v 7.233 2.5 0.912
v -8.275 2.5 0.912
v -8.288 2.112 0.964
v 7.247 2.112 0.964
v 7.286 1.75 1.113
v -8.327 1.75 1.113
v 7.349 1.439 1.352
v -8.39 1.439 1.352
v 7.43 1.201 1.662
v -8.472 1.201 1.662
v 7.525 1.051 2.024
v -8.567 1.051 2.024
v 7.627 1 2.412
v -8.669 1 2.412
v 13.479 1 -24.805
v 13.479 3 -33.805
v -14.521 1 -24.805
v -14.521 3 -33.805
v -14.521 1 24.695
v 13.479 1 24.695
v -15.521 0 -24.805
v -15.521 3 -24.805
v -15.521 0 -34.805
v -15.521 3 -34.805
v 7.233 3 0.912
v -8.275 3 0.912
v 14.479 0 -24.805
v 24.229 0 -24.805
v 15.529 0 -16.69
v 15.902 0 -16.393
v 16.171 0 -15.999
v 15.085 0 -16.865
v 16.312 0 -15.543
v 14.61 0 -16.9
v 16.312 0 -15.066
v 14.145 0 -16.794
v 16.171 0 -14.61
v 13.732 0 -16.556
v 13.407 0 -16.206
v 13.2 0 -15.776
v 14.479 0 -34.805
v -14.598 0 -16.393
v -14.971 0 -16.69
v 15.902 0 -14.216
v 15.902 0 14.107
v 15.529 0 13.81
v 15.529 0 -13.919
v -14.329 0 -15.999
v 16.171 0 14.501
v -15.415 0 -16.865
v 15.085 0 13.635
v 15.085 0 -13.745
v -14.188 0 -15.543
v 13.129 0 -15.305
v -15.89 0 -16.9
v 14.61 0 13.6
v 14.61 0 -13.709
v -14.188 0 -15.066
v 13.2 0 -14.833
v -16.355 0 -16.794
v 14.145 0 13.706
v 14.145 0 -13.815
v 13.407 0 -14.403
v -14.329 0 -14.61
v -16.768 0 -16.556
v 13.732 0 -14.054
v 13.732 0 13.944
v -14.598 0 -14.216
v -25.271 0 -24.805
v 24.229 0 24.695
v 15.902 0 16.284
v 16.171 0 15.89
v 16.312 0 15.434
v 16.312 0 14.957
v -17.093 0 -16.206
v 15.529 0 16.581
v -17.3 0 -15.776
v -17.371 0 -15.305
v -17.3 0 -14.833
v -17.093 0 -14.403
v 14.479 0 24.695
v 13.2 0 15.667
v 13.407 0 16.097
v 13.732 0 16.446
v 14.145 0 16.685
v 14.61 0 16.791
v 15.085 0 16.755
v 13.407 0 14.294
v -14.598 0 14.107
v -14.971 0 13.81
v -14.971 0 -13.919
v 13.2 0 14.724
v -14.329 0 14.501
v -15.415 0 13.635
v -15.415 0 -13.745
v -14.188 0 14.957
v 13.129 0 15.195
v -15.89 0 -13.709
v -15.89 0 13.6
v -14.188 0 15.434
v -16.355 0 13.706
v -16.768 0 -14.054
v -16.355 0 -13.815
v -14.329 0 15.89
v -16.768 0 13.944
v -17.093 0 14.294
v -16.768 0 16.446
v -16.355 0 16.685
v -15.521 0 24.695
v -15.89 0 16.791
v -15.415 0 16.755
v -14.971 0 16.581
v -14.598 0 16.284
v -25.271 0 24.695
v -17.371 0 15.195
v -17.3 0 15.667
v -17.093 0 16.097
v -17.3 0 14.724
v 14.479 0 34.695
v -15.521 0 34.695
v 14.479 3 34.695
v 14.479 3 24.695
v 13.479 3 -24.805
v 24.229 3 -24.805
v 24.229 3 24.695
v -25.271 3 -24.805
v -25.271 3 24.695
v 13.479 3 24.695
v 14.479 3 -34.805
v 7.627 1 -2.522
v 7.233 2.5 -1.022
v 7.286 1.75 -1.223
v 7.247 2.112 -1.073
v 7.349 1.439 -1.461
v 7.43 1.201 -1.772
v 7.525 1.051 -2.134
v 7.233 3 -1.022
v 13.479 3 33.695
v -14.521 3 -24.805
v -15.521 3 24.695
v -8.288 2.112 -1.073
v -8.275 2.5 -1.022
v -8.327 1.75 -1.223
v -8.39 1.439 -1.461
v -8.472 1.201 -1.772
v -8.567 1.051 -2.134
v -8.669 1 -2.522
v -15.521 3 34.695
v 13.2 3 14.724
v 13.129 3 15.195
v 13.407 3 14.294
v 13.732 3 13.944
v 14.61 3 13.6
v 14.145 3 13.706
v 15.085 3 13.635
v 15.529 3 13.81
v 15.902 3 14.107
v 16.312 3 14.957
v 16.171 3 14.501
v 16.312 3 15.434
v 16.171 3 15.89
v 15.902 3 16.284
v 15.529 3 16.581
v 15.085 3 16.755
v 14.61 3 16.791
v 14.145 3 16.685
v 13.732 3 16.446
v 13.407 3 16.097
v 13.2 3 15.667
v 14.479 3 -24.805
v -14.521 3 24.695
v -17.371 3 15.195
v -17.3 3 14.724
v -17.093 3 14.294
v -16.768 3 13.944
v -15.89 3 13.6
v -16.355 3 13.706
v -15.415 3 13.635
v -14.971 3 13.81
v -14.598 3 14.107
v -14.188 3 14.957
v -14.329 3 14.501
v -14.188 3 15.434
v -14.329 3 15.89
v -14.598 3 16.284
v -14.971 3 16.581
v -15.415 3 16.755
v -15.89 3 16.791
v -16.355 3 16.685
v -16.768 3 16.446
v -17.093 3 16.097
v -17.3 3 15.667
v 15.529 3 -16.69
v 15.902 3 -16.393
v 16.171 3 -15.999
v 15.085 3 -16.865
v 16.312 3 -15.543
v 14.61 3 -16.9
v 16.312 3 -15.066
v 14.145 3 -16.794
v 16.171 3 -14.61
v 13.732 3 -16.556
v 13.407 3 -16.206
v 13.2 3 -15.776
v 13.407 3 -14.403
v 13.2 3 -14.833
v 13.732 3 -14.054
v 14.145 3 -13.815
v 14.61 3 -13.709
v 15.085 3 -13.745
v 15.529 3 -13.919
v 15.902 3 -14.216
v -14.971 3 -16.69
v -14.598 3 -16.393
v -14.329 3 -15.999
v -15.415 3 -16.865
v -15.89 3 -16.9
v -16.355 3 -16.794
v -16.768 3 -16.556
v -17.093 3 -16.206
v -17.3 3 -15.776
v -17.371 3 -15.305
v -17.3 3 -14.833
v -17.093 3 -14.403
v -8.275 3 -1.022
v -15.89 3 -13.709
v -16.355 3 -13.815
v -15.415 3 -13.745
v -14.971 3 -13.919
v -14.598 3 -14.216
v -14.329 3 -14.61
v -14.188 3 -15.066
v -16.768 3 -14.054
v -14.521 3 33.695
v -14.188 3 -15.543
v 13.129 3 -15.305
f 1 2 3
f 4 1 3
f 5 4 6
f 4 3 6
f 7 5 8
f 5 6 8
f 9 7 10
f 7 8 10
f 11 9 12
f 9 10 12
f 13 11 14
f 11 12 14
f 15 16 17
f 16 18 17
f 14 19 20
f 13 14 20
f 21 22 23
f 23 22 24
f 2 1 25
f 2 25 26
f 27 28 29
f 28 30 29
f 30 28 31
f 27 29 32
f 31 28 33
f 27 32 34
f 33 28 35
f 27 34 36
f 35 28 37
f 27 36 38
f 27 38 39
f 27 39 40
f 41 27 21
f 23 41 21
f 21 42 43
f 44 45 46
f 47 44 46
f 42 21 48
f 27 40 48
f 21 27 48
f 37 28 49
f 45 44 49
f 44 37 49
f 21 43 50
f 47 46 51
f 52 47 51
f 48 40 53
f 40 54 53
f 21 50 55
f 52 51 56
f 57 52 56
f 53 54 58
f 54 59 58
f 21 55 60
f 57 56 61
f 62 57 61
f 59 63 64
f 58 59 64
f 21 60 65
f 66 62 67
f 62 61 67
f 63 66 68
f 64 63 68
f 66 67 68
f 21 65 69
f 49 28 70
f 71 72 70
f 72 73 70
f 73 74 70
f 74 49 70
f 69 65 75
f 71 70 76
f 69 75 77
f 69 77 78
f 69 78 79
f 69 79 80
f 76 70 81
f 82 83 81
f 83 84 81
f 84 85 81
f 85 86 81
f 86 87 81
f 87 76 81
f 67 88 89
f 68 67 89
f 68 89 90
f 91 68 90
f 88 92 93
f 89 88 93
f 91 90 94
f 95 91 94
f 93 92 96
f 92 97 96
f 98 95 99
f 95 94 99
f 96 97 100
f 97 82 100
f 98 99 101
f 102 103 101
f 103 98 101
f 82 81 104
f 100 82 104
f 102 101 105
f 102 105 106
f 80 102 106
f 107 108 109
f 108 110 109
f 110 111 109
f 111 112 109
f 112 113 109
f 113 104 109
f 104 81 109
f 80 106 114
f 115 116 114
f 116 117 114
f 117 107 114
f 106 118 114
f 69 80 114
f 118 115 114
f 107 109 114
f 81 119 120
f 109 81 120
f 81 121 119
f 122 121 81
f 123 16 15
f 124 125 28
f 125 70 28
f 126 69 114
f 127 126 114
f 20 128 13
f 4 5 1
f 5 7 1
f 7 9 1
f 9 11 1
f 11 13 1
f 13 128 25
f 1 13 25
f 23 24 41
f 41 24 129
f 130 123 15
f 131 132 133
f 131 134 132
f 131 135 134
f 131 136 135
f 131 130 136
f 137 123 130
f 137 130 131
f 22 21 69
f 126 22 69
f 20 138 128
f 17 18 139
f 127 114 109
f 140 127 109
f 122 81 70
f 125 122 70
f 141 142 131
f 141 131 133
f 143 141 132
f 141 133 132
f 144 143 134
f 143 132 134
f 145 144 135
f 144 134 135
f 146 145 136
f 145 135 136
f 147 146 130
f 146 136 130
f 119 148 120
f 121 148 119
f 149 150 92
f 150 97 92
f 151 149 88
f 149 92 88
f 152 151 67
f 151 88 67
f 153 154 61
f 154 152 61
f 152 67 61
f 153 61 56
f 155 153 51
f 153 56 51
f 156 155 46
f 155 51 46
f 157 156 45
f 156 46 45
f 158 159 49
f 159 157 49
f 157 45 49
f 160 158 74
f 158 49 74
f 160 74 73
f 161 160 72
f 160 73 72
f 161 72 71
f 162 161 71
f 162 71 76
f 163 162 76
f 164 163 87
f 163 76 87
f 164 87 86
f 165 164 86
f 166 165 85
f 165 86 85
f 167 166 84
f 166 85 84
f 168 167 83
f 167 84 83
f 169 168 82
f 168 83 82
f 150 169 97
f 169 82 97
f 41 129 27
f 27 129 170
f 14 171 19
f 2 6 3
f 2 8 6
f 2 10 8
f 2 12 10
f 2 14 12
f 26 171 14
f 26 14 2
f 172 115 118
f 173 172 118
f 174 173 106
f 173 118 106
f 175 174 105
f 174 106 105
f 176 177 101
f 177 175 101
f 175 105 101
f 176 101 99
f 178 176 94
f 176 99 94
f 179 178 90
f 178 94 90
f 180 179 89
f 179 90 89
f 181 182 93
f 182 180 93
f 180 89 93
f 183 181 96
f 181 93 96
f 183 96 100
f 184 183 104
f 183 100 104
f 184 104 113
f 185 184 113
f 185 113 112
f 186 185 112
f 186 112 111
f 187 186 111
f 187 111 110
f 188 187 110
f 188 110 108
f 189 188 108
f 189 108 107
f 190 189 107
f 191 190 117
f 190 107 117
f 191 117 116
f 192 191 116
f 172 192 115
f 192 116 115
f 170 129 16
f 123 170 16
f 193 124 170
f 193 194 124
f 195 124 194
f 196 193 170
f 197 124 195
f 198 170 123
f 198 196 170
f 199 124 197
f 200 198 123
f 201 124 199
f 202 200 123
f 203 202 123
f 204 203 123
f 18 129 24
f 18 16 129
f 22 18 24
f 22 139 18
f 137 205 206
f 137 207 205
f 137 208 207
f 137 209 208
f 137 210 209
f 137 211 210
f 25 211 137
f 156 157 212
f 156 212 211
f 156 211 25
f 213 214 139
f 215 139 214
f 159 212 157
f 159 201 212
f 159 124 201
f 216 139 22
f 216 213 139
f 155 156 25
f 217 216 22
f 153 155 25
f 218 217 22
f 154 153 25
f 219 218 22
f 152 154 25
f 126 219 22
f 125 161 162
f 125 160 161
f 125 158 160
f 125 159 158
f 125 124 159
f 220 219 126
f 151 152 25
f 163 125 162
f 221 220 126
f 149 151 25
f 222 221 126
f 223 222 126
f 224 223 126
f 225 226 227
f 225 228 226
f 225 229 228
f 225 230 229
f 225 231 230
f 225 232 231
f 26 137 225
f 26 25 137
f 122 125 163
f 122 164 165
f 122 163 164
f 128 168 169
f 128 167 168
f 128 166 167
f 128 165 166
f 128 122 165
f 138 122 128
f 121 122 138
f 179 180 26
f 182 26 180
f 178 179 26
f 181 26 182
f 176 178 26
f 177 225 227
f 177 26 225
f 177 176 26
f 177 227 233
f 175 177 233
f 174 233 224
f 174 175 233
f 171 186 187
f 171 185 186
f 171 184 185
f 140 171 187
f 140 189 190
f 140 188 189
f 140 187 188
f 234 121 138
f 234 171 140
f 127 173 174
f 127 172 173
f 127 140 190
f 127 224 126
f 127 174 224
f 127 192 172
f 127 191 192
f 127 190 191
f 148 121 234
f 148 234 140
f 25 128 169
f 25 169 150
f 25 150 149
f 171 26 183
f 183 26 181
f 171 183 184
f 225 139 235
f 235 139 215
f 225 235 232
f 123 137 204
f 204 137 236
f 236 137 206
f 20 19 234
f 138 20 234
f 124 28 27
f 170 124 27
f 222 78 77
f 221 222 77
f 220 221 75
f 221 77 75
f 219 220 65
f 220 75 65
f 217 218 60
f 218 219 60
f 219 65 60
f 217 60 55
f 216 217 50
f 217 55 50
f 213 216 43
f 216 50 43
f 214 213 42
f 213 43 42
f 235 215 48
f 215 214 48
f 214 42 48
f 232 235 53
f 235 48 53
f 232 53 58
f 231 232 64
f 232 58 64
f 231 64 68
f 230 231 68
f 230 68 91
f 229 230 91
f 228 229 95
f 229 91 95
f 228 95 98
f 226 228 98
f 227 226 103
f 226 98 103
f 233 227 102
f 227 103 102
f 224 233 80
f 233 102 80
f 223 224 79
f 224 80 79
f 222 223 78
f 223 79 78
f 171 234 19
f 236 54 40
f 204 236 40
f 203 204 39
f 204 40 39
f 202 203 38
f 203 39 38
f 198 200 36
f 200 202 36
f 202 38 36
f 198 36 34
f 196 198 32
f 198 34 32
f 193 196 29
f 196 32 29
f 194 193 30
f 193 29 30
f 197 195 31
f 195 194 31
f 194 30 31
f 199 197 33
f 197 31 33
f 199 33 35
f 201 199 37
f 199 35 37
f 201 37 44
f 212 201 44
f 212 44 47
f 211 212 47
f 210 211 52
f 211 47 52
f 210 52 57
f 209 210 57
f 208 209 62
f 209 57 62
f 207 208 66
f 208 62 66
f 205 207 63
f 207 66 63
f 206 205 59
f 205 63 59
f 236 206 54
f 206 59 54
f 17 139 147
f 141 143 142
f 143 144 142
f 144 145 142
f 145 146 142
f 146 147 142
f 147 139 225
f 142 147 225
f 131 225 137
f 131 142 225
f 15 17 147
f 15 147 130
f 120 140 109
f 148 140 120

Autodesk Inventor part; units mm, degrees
ref_plane "YZ Plane" through (0, 0, 0) normal (1, 0, 0) x (0, 1, 0)
ref_plane "XZ Plane" through (0, 0, 0) normal (0, 1, 0) x (-1, 0, 0)
ref_plane "XY Plane" through (0, 0, 0) normal (0, 0, 1) x (1, 0, 0)
sketch "Sketch1" plane through (0, 0, 0) normal (0, 1, 0) x (-1, 0, 0)
  line L0 (25.2706, 24.6953) -> (-24.2294, 24.6953)
  line L1 (-24.2294, 24.6953) -> (-24.2294, -24.8047)
  line L2 (-24.2294, -24.8047) -> (25.2706, -24.8047)
  line L3 (25.2706, -24.8047) -> (25.2706, 24.6953)
  circle A0 centre (15.7706, 15.1953) radius 1.6
  circle A1 centre (15.7706, -15.3047) radius 1.6
  circle A2 centre (-14.7294, 15.1953) radius 1.6
  circle A3 centre (-14.7294, -15.3047) radius 1.6
  dimension "d17" = 49.5
  dimension "d18" = 49.5
  dimension "d19" = 3.2
  dimension "d20" = 3.2
  dimension "d21" = 30.5
  dimension "d22" = 9.5
  dimension "d23" = 9.5
  dimension "d24" = 9.5
  dimension "d25" = 9.5
  dimension "d26" = 3.2
  dimension "d27" = 3.2
  dimension "d28" = 30.5
  dimension "d29" = 30.5
  dimension "d30" = 30.5
  dimension "d31" = 9.5
  dimension "d32" = 9.5
  dimension "d33" = 9.5
  dimension "d34" = 9.5
extrude "Extrusion1" add sketch "Sketch1" along normal blind 3
sketch "Sketch2" plane through (0, 3, 0) normal (0, 1, 0) x (1, 0, 0)
  line L0 (-25.2706, -24.6953) -> (24.2294, -24.6953) projected
  line L1 (-0.5206, -24.6953) -> (-0.5206, 24.8047)
  line L2 (24.2294, 24.8047) -> (-25.2706, 24.8047) projected
  line L3 (-0.5206, -24.6953) -> (-15.5206, -24.6953)
  line L4 (-15.5206, -24.6953) -> (-15.5206, -34.6953)
  line L5 (-15.5206, -34.6953) -> (14.4794, -34.6953)
  line L6 (14.4794, -34.6953) -> (14.4794, -24.6953)
  line L7 (14.4794, -24.6953) -> (-0.5206, -24.6953)
  line L8 (-0.5206, 24.8047) -> (-15.5206, 24.8047)
  line L9 (-15.5206, 24.8047) -> (-15.5206, 34.8047)
  line L10 (-15.5206, 34.8047) -> (14.4794, 34.8047)
  line L11 (14.4794, 34.8047) -> (14.4794, 24.8047)
  line L12 (-0.5206, 24.8047) -> (14.4794, 24.8047)
  point P0 (0, 0)
  dimension "d37" = 15
  dimension "d38" = 10
  dimension "d39" = 30
  dimension "d40" = 15
  dimension "d41" = 10
  dimension "d42" = 30
extrude "Extrusion2" add sketch "Sketch2" against normal blind 3
sketch "Sketch3" plane through (0, 3, 0) normal (0, 1, 0) x (1, 0, 0)
  line L0 (-15.5206, -34.6953) -> (14.4794, -34.6953) projected
  line L1 (-0.5206, -34.6953) -> (-0.5206, 34.8047)
  line L2 (-15.5206, 34.8047) -> (14.4794, 34.8047) projected
  line L3 (-0.5206, -34.6953) -> (-0.5206, -33.6953)
  line L4 (-0.5206, -33.6953) -> (-14.5206, -33.6953)
  line L5 (-14.5206, -33.6953) -> (-14.5206, -24.6953)
  line L6 (-0.5206, -33.6953) -> (13.4794, -33.6953)
  line L7 (13.4794, -33.6953) -> (13.4794, -24.6953)
  line L8 (-0.5206, 34.8047) -> (-0.5206, 33.8047)
  line L9 (-0.5206, 33.8047) -> (-14.5206, 33.8047)
  line L10 (-14.5206, 33.8047) -> (-14.5206, 24.8047)
  line L11 (-0.5206, 33.8047) -> (13.4794, 33.8047)
  line L12 (13.4794, 33.8047) -> (13.4794, 24.8047)
  circle A0 centre (-0.5206, 0.0547) radius 7.5
  line L13 (-14.5206, -24.6953) -> (-8.0206, 0.0547)
  line L14 (-14.5206, 24.8047) -> (-8.0206, 0.0547)
  line L15 (13.4794, -24.6953) -> (6.9794, 0.0547)
  line L16 (13.4794, 24.8047) -> (6.9794, 0.0547)
  point P0 (0, 0)
  dimension "d45" = 1
  dimension "d46" = 14
  dimension "d47" = 14
  dimension "d48" = 1
  dimension "d49" = 14
  dimension "d50" = 14
  dimension "d51" = 15
extrude "Extrusion3" cut sketch "Sketch3" against normal blind 2
sketch "Sketch4" plane through (0, 1, 0) normal (0, 1, 0) x (1, 0, 0)
  point P0 (0, 0)
sketch "Sketch5" plane through (0, 1, 0) normal (0, 1, 0) x (1, 0, 0)
  line L0 (-14.5206, -24.6953) -> (-8.0206, 0.0547) projected
  line L1 (6.9794, 0.0547) -> (13.4794, -24.6953) projected
  line L2 (-8.0206, 0.0547) -> (6.9794, 0.0547)
  line L3 (-8.0206, 0.0547) -> (-8.2747, 1.0219)
  line L4 (-8.0206, 0.0547) -> (-14.5206, 24.8047) projected
  line L5 (-8.0206, 0.0547) -> (-8.2747, -0.9125)
  line L6 (13.4794, 24.8047) -> (6.9794, 0.0547) projected
  line L7 (6.9794, 0.0547) -> (7.2334, 1.0219)
  line L8 (6.9794, 0.0547) -> (7.2334, -0.9125)
  line L9 (7.2334, -0.9125) -> (-8.2747, -0.9125)
  line L10 (-8.2747, 1.0219) -> (7.2334, 1.0219)
  point P0 (0, 0)
  dimension "d56" = 1
  dimension "d57" = 1
  dimension "d58" = 1
  dimension "d59" = 1
extrude "Extrusion4" add sketch "Sketch5" along normal blind 2
fillet "Face Fillet3" radius 1.5 1 edges at (-0.5206, 1, -1.0219)
fillet "Face Fillet4" radius 1.5 1 edges at (-0.5206, 1, 0.9125)
sketch "Sketch6" plane through (-14.5206, 3, -24.8047) normal (1, 0, 0) x (0, 0, -1)
  line L0 (-22.2828, -2) -> (0, -2) projected
  line L1 (9, 0) -> (9, -2) projected
  line L2 (0, -2) -> (9, -2)
  line L3 (9, -2) -> (9, 0)
  line L4 (9, 0) -> (0, -2)
  line L5 (-58.5, 0) -> (-49.5, 0) projected
  line L6 (-58.5, 0) -> (-58.5, -2)
  line L7 (-58.5, -2) -> (-49.5, -2)
  line L8 (-49.5, -2) -> (-58.5, 0)
  point P0 (-24.8047, -3)
extrude "Extrusion5" add sketch "Sketch6" along normal blind 28.9875
properties material "PC/ABS Plastic"
